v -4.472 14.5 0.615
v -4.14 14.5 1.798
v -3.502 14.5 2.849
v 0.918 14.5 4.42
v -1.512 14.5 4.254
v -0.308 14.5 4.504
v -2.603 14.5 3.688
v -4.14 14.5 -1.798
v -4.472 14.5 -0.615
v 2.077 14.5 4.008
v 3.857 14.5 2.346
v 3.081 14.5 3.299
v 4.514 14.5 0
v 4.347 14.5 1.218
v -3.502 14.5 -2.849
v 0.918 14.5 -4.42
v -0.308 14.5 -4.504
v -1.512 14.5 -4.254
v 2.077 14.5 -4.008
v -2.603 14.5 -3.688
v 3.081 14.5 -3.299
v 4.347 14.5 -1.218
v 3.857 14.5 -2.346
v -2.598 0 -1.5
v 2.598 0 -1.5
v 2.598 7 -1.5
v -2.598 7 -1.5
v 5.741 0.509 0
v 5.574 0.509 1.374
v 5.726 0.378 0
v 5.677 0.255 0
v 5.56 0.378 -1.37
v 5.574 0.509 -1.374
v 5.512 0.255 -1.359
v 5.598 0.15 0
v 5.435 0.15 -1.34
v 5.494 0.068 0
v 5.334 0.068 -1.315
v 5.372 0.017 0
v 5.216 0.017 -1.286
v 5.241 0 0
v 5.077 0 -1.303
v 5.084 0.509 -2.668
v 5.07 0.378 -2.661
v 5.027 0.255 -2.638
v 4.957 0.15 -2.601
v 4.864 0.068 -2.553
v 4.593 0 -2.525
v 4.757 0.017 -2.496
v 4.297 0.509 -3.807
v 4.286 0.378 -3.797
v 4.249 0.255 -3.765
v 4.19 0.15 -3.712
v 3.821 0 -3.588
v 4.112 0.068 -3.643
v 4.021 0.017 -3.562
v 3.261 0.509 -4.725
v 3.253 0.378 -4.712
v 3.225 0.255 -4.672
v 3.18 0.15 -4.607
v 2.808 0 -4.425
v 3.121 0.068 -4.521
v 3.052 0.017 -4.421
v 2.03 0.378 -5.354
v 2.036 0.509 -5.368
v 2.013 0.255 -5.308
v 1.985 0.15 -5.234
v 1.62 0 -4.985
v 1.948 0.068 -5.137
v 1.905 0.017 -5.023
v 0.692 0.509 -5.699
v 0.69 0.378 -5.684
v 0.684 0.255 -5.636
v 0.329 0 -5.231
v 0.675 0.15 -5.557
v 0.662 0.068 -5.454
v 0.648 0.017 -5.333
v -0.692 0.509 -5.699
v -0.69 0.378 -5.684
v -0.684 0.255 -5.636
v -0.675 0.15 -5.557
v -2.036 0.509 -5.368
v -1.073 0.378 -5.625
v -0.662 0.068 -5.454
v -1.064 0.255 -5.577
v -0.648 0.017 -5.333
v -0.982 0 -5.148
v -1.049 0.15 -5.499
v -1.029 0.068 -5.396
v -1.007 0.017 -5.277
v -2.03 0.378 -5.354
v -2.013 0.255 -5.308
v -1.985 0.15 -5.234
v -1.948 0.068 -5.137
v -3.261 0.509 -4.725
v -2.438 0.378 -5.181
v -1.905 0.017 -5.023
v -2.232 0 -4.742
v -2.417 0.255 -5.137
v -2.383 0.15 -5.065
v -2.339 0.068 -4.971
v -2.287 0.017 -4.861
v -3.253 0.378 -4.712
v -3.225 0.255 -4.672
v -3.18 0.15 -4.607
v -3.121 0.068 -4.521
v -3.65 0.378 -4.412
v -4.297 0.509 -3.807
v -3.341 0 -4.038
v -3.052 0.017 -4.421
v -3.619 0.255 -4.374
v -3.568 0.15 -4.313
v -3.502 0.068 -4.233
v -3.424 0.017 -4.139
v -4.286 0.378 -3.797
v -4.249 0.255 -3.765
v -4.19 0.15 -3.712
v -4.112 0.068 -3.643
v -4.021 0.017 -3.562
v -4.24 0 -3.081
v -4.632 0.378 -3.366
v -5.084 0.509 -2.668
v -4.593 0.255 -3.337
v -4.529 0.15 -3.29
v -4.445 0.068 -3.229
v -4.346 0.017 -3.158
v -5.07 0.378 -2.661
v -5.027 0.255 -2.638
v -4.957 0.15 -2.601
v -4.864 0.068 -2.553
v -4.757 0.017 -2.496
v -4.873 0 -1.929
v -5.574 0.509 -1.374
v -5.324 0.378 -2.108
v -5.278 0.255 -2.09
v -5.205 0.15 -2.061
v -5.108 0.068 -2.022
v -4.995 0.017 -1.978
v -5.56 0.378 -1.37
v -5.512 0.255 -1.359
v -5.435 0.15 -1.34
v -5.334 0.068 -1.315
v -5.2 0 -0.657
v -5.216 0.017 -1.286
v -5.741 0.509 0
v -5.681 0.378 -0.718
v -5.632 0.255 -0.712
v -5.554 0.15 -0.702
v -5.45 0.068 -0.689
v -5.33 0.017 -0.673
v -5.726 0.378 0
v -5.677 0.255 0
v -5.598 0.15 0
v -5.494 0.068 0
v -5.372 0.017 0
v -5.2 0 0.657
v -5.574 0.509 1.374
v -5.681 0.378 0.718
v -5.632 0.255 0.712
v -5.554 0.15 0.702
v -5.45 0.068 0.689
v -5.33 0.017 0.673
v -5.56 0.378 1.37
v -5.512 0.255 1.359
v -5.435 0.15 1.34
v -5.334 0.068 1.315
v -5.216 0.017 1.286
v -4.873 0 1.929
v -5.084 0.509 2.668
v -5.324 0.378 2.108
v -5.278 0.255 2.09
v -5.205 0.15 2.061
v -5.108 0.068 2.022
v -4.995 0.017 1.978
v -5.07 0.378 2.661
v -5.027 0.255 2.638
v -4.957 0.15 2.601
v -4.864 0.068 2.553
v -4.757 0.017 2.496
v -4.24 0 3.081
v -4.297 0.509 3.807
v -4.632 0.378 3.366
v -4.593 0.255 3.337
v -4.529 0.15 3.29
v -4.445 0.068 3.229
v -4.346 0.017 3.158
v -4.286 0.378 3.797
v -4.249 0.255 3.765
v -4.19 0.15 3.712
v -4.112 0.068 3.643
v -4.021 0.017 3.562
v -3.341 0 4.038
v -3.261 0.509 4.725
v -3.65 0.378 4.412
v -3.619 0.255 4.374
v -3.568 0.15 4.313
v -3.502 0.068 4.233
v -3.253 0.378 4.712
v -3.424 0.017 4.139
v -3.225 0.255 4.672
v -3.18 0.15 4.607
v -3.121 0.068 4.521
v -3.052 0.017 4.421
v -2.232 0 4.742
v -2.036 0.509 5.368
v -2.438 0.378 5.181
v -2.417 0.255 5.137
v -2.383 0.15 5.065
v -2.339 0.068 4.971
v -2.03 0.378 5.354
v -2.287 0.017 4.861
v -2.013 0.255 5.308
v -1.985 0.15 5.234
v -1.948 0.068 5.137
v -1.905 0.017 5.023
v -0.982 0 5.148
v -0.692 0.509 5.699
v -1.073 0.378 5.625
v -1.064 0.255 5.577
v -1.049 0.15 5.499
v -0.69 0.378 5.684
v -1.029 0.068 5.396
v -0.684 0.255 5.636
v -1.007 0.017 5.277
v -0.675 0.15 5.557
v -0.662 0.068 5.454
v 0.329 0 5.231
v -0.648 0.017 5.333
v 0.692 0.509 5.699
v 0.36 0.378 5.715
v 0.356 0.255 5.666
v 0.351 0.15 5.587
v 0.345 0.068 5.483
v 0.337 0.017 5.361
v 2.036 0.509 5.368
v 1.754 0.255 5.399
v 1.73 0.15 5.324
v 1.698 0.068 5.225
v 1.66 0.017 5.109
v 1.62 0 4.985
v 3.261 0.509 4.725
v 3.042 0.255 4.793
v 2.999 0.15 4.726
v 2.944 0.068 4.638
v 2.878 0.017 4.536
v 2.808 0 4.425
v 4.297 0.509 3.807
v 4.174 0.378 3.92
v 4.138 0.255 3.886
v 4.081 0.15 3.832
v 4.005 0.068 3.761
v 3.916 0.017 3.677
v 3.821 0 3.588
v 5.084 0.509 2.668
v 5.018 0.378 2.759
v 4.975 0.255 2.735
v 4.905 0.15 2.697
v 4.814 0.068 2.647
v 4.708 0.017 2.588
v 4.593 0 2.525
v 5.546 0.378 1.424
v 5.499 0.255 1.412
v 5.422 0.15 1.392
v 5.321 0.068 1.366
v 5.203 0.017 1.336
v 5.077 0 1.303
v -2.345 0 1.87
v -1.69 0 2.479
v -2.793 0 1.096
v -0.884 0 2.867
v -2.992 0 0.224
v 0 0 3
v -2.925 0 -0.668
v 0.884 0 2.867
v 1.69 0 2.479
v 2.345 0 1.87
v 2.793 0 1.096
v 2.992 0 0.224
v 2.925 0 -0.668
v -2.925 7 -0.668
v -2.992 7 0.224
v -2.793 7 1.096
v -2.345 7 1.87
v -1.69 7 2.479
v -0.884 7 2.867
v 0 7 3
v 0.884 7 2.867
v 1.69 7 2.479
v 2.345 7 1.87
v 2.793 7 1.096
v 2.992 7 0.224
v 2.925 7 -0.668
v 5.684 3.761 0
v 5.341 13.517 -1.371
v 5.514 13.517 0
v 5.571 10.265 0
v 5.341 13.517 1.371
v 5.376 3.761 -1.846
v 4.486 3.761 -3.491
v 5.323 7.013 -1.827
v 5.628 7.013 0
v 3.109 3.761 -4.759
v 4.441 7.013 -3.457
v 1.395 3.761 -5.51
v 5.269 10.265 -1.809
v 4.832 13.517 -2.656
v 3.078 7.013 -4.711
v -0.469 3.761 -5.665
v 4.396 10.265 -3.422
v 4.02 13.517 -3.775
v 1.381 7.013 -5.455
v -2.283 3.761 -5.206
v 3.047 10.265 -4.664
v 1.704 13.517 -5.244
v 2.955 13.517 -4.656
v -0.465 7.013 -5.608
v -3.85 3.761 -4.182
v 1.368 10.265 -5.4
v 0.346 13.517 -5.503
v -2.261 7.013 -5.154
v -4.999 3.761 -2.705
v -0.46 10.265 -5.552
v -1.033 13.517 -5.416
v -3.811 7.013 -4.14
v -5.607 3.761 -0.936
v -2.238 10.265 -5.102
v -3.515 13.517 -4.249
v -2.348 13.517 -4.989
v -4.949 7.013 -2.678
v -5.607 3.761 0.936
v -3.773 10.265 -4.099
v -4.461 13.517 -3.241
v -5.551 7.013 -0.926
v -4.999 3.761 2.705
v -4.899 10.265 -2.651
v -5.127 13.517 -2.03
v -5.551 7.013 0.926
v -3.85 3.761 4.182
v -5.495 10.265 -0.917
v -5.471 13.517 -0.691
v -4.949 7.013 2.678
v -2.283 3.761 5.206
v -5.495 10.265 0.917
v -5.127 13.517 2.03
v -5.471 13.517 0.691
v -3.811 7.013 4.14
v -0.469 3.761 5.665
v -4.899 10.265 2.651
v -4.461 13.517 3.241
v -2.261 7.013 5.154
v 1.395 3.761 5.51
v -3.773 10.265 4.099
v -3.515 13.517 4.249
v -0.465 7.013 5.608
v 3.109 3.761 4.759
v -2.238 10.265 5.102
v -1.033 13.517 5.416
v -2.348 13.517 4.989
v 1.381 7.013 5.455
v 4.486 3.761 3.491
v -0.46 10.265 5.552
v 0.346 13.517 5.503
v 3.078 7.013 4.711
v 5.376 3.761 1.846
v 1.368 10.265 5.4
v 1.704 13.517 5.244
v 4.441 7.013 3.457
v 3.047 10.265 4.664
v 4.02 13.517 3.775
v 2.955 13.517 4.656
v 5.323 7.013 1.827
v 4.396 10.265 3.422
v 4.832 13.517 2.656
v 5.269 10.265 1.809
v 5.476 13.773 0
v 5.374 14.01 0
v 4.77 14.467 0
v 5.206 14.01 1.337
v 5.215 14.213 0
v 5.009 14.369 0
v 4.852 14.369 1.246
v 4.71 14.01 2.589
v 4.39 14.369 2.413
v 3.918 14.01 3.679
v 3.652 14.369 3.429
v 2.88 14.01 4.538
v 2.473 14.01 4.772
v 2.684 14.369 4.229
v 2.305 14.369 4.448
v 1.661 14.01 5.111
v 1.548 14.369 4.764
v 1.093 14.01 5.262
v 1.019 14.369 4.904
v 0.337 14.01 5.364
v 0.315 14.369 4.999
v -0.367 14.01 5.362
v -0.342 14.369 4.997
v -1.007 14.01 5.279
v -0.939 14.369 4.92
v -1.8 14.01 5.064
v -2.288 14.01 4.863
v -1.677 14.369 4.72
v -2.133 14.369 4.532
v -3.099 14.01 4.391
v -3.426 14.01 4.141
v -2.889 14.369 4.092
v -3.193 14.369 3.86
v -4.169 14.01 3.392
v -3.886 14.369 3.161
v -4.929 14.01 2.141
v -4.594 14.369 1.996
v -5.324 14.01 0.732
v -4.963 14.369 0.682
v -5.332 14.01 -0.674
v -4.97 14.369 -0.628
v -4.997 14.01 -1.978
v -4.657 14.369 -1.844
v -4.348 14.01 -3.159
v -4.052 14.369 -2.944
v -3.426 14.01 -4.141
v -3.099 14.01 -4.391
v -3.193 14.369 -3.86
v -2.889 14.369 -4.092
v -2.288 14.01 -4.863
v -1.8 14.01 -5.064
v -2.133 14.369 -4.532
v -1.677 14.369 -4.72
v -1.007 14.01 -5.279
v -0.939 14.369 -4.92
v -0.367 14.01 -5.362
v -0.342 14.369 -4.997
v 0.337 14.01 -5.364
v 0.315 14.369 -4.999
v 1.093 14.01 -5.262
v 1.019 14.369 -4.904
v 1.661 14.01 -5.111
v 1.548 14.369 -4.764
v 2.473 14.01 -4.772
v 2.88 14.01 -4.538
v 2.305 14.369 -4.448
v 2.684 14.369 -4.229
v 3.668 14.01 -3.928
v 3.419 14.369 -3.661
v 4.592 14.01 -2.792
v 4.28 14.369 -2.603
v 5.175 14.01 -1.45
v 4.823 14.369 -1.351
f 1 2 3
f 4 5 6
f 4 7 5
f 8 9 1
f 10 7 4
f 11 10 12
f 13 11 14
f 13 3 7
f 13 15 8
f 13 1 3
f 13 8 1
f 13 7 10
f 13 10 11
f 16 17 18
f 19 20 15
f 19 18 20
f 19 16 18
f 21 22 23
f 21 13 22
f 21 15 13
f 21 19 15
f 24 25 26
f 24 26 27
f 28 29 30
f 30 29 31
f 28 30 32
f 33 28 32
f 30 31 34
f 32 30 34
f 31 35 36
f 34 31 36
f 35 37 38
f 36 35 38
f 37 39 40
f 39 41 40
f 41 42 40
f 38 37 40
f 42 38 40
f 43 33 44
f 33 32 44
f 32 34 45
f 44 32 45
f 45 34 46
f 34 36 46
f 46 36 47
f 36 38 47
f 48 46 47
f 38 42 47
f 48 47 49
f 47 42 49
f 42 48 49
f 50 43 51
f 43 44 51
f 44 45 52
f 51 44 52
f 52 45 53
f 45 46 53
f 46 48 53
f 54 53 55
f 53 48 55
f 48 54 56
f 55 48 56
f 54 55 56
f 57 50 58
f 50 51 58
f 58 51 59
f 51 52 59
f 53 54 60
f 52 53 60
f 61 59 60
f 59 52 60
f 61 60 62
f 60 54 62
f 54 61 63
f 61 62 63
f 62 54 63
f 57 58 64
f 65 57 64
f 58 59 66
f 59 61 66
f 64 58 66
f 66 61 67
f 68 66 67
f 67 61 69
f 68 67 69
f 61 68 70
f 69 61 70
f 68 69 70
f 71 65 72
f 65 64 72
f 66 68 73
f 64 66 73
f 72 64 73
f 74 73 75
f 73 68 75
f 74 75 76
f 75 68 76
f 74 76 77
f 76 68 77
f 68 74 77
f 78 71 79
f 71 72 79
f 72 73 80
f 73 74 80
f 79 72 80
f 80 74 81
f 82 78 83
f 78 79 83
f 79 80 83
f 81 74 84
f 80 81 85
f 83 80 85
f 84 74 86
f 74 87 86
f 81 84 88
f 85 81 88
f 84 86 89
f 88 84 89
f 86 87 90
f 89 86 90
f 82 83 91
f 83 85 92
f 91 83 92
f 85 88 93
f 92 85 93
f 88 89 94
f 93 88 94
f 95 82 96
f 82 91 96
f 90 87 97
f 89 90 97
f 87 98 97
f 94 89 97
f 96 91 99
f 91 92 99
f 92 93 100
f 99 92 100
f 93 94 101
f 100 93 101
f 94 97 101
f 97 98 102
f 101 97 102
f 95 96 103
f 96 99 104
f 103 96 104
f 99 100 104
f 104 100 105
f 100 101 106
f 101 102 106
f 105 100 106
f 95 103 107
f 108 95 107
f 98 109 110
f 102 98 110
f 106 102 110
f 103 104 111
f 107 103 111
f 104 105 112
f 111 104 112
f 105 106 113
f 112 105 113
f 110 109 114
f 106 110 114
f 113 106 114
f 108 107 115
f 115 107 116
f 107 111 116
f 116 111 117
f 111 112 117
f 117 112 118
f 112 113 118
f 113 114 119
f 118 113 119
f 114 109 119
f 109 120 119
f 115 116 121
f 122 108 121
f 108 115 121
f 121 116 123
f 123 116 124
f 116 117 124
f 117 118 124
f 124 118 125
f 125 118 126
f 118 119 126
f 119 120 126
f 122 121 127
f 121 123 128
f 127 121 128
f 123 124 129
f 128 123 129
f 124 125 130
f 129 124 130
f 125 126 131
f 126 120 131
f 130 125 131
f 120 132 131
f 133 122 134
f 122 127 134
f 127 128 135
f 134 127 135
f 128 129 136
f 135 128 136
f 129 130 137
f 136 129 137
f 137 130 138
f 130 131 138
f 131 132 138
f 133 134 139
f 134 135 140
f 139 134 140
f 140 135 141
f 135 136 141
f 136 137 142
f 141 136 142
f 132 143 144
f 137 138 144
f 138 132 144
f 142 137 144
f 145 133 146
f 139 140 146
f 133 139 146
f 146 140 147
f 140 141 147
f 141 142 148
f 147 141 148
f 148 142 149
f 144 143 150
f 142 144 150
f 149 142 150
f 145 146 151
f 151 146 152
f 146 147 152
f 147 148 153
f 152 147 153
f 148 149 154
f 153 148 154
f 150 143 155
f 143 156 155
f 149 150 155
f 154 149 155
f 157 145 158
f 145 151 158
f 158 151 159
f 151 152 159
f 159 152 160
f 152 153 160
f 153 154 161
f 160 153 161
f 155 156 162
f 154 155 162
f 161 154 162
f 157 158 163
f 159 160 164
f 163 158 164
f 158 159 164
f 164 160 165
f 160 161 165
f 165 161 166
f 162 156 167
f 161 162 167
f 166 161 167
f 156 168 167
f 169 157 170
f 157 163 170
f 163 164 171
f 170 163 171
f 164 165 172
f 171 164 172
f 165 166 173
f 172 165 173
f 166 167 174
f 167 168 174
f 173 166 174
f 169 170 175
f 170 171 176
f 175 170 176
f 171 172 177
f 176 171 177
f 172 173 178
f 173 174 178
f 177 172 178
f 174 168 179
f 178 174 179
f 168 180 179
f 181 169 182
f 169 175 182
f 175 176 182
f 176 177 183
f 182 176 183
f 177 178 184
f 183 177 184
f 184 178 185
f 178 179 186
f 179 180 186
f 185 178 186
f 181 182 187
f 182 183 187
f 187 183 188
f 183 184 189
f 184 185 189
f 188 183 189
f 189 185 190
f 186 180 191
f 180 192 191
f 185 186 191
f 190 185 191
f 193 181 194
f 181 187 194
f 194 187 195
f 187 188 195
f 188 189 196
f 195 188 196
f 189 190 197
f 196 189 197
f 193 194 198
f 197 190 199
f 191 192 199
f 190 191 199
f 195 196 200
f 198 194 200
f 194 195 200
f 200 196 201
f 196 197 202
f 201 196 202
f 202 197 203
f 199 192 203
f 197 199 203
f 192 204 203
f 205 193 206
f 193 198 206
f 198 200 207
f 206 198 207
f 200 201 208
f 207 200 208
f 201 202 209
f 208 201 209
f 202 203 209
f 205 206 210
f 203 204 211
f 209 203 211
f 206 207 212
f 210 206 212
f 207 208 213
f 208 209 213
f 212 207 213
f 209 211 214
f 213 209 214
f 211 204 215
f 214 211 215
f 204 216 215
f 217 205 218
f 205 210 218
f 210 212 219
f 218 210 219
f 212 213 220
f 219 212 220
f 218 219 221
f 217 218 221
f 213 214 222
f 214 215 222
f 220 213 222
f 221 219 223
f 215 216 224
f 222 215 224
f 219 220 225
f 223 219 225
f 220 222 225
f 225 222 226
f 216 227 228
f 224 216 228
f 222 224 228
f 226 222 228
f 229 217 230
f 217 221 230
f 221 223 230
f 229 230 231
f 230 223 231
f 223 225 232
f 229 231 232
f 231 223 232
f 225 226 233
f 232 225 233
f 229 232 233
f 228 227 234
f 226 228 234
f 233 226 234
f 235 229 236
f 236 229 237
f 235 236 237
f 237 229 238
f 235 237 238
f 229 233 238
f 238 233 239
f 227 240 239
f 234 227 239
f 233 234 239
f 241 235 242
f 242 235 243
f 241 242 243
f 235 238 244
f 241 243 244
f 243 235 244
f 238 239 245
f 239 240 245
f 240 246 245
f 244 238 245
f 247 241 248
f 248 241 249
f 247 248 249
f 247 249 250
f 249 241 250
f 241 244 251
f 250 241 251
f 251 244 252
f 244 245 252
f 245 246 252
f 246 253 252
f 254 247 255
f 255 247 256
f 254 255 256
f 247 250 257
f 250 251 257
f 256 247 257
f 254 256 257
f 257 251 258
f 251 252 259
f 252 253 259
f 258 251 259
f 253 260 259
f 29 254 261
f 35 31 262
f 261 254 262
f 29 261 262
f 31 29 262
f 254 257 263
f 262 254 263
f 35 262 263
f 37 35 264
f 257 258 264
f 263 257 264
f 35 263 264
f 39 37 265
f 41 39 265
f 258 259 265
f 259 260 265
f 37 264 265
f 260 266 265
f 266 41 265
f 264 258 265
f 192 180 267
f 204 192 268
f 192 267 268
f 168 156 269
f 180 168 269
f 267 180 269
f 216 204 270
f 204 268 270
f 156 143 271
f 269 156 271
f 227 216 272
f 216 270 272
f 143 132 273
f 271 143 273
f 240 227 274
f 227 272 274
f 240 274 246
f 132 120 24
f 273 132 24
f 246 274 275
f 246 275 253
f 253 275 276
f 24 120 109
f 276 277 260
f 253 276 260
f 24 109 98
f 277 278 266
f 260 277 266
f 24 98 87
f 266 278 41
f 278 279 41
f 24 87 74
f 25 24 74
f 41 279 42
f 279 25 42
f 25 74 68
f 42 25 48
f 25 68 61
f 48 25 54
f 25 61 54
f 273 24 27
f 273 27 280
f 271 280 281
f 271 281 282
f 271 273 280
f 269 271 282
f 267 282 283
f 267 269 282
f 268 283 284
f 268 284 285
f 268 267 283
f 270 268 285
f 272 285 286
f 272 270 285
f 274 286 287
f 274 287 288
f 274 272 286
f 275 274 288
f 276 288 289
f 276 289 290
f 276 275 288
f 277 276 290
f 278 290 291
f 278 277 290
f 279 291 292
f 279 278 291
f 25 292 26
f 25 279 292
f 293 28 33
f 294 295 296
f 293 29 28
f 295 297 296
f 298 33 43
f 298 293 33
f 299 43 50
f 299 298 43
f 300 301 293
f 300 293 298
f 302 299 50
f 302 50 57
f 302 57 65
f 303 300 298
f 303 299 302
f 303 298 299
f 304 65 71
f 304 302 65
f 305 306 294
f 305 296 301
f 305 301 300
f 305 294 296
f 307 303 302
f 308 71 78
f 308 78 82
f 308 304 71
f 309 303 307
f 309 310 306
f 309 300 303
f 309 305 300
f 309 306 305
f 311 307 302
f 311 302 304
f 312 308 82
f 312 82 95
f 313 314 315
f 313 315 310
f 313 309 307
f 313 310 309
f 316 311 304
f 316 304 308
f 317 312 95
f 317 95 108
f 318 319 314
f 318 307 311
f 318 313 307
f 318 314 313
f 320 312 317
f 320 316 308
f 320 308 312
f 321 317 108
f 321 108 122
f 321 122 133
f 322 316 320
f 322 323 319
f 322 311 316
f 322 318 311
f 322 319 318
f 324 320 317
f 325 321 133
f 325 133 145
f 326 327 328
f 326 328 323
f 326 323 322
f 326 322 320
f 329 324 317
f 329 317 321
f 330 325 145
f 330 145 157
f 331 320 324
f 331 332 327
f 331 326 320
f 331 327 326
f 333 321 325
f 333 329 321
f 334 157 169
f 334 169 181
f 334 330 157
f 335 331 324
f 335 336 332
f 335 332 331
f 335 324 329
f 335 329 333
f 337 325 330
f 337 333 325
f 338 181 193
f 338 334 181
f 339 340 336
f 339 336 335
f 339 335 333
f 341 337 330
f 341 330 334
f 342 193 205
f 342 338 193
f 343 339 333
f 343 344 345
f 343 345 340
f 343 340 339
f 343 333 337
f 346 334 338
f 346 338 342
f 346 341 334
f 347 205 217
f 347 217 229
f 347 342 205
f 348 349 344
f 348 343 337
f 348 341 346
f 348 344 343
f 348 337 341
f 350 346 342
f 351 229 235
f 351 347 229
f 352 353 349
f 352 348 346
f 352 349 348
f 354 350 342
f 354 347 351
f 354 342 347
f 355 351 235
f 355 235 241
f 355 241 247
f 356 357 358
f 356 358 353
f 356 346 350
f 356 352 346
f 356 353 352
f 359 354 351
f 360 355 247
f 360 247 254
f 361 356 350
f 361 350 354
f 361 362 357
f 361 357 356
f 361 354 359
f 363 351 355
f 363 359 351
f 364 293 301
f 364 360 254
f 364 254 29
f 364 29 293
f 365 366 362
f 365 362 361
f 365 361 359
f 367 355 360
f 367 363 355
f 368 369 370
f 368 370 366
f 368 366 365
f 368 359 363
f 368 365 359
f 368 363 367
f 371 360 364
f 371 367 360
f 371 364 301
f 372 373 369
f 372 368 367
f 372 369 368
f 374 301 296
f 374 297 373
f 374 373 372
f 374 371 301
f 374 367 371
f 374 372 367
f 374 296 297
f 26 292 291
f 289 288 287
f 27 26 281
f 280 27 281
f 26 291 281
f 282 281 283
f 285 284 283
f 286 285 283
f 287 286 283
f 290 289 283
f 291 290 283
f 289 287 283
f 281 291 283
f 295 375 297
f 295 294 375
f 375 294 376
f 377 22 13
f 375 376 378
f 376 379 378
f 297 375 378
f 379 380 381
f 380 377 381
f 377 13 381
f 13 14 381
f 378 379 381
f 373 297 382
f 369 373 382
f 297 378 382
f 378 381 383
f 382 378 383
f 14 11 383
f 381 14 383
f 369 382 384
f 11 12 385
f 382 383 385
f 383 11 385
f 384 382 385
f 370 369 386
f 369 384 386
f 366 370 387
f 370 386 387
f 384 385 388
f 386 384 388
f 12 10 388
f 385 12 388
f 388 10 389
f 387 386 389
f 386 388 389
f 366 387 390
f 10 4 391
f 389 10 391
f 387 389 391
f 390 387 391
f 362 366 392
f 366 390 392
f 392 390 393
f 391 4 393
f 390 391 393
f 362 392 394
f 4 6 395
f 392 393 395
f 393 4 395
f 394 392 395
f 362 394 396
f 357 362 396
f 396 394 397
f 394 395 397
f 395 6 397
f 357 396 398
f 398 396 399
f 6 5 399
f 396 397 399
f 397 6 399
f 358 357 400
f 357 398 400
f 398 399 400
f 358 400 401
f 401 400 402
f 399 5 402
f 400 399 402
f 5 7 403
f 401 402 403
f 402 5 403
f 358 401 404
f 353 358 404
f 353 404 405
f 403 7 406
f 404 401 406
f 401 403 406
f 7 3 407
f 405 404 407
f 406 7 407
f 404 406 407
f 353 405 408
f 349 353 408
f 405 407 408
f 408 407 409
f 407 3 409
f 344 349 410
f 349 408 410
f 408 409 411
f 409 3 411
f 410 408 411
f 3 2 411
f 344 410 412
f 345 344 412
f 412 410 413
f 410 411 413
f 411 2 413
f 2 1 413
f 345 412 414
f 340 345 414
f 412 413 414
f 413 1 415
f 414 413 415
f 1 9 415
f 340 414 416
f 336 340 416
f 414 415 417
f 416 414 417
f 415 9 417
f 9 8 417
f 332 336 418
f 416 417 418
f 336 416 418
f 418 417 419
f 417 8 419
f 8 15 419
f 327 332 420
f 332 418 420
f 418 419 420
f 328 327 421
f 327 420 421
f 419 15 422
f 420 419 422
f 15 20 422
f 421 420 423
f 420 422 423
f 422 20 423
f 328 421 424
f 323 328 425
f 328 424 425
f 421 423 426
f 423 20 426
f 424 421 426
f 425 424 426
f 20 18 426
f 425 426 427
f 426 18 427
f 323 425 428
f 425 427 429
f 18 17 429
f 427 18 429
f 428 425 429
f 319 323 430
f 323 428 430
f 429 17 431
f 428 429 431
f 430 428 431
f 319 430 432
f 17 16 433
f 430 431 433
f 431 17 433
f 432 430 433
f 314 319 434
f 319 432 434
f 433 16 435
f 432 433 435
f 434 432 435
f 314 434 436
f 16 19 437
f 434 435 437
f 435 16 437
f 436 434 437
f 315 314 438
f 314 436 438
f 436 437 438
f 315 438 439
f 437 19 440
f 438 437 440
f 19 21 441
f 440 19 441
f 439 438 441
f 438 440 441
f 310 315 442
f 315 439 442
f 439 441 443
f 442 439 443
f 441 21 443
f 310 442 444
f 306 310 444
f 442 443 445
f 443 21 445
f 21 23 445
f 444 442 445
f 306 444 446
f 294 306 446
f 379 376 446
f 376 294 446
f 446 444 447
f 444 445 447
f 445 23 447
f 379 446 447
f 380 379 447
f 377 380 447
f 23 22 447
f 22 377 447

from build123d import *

# Parameters (mm, degrees)
SKETCH1_R           = 5.75
BOSS_EXTRUDE1_DEPTH = 14.5
BOSS_EXTRUDE1_TAPER = 1
FILLET1_R           = 1
FILLET2_R           = 0.5
CUT_EXTRUDE1_DEPTH  = 7


with BuildPart() as part:
    # Sketch1 → Boss-Extrude1 (new body)
    with BuildSketch(Plane(origin=(0, 0, 0), x_dir=(1, 0, 0), z_dir=(0, 1, 0))):
        Circle(SKETCH1_R)
    extrude(amount=BOSS_EXTRUDE1_DEPTH, taper=BOSS_EXTRUDE1_TAPER)

    # Fillet1
    fillet1_edges = [part.edges().sort_by_distance(p)[0] for p in [
        (-5.496901559, 14.5, 0),
    ]]
    fillet(fillet1_edges, radius=FILLET1_R)

    # Fillet2
    fillet2_edges = [part.edges().sort_by_distance(p)[0] for p in [
        (-5.75, 0, 0),
    ]]
    fillet(fillet2_edges, radius=FILLET2_R)

    # Sketch2 → Cut-Extrude1 (cut)
    with BuildSketch(Plane.XZ):
        with BuildLine():
            Line((2.598076211, -1.5), (-2.598076211, -1.5))
            ThreePointArc((-2.598076211, -1.5), (0, 3), (2.598076211, -1.5))
        make_face()
    extrude(amount=-CUT_EXTRUDE1_DEPTH, mode=Mode.SUBTRACT)


solid = part.part
